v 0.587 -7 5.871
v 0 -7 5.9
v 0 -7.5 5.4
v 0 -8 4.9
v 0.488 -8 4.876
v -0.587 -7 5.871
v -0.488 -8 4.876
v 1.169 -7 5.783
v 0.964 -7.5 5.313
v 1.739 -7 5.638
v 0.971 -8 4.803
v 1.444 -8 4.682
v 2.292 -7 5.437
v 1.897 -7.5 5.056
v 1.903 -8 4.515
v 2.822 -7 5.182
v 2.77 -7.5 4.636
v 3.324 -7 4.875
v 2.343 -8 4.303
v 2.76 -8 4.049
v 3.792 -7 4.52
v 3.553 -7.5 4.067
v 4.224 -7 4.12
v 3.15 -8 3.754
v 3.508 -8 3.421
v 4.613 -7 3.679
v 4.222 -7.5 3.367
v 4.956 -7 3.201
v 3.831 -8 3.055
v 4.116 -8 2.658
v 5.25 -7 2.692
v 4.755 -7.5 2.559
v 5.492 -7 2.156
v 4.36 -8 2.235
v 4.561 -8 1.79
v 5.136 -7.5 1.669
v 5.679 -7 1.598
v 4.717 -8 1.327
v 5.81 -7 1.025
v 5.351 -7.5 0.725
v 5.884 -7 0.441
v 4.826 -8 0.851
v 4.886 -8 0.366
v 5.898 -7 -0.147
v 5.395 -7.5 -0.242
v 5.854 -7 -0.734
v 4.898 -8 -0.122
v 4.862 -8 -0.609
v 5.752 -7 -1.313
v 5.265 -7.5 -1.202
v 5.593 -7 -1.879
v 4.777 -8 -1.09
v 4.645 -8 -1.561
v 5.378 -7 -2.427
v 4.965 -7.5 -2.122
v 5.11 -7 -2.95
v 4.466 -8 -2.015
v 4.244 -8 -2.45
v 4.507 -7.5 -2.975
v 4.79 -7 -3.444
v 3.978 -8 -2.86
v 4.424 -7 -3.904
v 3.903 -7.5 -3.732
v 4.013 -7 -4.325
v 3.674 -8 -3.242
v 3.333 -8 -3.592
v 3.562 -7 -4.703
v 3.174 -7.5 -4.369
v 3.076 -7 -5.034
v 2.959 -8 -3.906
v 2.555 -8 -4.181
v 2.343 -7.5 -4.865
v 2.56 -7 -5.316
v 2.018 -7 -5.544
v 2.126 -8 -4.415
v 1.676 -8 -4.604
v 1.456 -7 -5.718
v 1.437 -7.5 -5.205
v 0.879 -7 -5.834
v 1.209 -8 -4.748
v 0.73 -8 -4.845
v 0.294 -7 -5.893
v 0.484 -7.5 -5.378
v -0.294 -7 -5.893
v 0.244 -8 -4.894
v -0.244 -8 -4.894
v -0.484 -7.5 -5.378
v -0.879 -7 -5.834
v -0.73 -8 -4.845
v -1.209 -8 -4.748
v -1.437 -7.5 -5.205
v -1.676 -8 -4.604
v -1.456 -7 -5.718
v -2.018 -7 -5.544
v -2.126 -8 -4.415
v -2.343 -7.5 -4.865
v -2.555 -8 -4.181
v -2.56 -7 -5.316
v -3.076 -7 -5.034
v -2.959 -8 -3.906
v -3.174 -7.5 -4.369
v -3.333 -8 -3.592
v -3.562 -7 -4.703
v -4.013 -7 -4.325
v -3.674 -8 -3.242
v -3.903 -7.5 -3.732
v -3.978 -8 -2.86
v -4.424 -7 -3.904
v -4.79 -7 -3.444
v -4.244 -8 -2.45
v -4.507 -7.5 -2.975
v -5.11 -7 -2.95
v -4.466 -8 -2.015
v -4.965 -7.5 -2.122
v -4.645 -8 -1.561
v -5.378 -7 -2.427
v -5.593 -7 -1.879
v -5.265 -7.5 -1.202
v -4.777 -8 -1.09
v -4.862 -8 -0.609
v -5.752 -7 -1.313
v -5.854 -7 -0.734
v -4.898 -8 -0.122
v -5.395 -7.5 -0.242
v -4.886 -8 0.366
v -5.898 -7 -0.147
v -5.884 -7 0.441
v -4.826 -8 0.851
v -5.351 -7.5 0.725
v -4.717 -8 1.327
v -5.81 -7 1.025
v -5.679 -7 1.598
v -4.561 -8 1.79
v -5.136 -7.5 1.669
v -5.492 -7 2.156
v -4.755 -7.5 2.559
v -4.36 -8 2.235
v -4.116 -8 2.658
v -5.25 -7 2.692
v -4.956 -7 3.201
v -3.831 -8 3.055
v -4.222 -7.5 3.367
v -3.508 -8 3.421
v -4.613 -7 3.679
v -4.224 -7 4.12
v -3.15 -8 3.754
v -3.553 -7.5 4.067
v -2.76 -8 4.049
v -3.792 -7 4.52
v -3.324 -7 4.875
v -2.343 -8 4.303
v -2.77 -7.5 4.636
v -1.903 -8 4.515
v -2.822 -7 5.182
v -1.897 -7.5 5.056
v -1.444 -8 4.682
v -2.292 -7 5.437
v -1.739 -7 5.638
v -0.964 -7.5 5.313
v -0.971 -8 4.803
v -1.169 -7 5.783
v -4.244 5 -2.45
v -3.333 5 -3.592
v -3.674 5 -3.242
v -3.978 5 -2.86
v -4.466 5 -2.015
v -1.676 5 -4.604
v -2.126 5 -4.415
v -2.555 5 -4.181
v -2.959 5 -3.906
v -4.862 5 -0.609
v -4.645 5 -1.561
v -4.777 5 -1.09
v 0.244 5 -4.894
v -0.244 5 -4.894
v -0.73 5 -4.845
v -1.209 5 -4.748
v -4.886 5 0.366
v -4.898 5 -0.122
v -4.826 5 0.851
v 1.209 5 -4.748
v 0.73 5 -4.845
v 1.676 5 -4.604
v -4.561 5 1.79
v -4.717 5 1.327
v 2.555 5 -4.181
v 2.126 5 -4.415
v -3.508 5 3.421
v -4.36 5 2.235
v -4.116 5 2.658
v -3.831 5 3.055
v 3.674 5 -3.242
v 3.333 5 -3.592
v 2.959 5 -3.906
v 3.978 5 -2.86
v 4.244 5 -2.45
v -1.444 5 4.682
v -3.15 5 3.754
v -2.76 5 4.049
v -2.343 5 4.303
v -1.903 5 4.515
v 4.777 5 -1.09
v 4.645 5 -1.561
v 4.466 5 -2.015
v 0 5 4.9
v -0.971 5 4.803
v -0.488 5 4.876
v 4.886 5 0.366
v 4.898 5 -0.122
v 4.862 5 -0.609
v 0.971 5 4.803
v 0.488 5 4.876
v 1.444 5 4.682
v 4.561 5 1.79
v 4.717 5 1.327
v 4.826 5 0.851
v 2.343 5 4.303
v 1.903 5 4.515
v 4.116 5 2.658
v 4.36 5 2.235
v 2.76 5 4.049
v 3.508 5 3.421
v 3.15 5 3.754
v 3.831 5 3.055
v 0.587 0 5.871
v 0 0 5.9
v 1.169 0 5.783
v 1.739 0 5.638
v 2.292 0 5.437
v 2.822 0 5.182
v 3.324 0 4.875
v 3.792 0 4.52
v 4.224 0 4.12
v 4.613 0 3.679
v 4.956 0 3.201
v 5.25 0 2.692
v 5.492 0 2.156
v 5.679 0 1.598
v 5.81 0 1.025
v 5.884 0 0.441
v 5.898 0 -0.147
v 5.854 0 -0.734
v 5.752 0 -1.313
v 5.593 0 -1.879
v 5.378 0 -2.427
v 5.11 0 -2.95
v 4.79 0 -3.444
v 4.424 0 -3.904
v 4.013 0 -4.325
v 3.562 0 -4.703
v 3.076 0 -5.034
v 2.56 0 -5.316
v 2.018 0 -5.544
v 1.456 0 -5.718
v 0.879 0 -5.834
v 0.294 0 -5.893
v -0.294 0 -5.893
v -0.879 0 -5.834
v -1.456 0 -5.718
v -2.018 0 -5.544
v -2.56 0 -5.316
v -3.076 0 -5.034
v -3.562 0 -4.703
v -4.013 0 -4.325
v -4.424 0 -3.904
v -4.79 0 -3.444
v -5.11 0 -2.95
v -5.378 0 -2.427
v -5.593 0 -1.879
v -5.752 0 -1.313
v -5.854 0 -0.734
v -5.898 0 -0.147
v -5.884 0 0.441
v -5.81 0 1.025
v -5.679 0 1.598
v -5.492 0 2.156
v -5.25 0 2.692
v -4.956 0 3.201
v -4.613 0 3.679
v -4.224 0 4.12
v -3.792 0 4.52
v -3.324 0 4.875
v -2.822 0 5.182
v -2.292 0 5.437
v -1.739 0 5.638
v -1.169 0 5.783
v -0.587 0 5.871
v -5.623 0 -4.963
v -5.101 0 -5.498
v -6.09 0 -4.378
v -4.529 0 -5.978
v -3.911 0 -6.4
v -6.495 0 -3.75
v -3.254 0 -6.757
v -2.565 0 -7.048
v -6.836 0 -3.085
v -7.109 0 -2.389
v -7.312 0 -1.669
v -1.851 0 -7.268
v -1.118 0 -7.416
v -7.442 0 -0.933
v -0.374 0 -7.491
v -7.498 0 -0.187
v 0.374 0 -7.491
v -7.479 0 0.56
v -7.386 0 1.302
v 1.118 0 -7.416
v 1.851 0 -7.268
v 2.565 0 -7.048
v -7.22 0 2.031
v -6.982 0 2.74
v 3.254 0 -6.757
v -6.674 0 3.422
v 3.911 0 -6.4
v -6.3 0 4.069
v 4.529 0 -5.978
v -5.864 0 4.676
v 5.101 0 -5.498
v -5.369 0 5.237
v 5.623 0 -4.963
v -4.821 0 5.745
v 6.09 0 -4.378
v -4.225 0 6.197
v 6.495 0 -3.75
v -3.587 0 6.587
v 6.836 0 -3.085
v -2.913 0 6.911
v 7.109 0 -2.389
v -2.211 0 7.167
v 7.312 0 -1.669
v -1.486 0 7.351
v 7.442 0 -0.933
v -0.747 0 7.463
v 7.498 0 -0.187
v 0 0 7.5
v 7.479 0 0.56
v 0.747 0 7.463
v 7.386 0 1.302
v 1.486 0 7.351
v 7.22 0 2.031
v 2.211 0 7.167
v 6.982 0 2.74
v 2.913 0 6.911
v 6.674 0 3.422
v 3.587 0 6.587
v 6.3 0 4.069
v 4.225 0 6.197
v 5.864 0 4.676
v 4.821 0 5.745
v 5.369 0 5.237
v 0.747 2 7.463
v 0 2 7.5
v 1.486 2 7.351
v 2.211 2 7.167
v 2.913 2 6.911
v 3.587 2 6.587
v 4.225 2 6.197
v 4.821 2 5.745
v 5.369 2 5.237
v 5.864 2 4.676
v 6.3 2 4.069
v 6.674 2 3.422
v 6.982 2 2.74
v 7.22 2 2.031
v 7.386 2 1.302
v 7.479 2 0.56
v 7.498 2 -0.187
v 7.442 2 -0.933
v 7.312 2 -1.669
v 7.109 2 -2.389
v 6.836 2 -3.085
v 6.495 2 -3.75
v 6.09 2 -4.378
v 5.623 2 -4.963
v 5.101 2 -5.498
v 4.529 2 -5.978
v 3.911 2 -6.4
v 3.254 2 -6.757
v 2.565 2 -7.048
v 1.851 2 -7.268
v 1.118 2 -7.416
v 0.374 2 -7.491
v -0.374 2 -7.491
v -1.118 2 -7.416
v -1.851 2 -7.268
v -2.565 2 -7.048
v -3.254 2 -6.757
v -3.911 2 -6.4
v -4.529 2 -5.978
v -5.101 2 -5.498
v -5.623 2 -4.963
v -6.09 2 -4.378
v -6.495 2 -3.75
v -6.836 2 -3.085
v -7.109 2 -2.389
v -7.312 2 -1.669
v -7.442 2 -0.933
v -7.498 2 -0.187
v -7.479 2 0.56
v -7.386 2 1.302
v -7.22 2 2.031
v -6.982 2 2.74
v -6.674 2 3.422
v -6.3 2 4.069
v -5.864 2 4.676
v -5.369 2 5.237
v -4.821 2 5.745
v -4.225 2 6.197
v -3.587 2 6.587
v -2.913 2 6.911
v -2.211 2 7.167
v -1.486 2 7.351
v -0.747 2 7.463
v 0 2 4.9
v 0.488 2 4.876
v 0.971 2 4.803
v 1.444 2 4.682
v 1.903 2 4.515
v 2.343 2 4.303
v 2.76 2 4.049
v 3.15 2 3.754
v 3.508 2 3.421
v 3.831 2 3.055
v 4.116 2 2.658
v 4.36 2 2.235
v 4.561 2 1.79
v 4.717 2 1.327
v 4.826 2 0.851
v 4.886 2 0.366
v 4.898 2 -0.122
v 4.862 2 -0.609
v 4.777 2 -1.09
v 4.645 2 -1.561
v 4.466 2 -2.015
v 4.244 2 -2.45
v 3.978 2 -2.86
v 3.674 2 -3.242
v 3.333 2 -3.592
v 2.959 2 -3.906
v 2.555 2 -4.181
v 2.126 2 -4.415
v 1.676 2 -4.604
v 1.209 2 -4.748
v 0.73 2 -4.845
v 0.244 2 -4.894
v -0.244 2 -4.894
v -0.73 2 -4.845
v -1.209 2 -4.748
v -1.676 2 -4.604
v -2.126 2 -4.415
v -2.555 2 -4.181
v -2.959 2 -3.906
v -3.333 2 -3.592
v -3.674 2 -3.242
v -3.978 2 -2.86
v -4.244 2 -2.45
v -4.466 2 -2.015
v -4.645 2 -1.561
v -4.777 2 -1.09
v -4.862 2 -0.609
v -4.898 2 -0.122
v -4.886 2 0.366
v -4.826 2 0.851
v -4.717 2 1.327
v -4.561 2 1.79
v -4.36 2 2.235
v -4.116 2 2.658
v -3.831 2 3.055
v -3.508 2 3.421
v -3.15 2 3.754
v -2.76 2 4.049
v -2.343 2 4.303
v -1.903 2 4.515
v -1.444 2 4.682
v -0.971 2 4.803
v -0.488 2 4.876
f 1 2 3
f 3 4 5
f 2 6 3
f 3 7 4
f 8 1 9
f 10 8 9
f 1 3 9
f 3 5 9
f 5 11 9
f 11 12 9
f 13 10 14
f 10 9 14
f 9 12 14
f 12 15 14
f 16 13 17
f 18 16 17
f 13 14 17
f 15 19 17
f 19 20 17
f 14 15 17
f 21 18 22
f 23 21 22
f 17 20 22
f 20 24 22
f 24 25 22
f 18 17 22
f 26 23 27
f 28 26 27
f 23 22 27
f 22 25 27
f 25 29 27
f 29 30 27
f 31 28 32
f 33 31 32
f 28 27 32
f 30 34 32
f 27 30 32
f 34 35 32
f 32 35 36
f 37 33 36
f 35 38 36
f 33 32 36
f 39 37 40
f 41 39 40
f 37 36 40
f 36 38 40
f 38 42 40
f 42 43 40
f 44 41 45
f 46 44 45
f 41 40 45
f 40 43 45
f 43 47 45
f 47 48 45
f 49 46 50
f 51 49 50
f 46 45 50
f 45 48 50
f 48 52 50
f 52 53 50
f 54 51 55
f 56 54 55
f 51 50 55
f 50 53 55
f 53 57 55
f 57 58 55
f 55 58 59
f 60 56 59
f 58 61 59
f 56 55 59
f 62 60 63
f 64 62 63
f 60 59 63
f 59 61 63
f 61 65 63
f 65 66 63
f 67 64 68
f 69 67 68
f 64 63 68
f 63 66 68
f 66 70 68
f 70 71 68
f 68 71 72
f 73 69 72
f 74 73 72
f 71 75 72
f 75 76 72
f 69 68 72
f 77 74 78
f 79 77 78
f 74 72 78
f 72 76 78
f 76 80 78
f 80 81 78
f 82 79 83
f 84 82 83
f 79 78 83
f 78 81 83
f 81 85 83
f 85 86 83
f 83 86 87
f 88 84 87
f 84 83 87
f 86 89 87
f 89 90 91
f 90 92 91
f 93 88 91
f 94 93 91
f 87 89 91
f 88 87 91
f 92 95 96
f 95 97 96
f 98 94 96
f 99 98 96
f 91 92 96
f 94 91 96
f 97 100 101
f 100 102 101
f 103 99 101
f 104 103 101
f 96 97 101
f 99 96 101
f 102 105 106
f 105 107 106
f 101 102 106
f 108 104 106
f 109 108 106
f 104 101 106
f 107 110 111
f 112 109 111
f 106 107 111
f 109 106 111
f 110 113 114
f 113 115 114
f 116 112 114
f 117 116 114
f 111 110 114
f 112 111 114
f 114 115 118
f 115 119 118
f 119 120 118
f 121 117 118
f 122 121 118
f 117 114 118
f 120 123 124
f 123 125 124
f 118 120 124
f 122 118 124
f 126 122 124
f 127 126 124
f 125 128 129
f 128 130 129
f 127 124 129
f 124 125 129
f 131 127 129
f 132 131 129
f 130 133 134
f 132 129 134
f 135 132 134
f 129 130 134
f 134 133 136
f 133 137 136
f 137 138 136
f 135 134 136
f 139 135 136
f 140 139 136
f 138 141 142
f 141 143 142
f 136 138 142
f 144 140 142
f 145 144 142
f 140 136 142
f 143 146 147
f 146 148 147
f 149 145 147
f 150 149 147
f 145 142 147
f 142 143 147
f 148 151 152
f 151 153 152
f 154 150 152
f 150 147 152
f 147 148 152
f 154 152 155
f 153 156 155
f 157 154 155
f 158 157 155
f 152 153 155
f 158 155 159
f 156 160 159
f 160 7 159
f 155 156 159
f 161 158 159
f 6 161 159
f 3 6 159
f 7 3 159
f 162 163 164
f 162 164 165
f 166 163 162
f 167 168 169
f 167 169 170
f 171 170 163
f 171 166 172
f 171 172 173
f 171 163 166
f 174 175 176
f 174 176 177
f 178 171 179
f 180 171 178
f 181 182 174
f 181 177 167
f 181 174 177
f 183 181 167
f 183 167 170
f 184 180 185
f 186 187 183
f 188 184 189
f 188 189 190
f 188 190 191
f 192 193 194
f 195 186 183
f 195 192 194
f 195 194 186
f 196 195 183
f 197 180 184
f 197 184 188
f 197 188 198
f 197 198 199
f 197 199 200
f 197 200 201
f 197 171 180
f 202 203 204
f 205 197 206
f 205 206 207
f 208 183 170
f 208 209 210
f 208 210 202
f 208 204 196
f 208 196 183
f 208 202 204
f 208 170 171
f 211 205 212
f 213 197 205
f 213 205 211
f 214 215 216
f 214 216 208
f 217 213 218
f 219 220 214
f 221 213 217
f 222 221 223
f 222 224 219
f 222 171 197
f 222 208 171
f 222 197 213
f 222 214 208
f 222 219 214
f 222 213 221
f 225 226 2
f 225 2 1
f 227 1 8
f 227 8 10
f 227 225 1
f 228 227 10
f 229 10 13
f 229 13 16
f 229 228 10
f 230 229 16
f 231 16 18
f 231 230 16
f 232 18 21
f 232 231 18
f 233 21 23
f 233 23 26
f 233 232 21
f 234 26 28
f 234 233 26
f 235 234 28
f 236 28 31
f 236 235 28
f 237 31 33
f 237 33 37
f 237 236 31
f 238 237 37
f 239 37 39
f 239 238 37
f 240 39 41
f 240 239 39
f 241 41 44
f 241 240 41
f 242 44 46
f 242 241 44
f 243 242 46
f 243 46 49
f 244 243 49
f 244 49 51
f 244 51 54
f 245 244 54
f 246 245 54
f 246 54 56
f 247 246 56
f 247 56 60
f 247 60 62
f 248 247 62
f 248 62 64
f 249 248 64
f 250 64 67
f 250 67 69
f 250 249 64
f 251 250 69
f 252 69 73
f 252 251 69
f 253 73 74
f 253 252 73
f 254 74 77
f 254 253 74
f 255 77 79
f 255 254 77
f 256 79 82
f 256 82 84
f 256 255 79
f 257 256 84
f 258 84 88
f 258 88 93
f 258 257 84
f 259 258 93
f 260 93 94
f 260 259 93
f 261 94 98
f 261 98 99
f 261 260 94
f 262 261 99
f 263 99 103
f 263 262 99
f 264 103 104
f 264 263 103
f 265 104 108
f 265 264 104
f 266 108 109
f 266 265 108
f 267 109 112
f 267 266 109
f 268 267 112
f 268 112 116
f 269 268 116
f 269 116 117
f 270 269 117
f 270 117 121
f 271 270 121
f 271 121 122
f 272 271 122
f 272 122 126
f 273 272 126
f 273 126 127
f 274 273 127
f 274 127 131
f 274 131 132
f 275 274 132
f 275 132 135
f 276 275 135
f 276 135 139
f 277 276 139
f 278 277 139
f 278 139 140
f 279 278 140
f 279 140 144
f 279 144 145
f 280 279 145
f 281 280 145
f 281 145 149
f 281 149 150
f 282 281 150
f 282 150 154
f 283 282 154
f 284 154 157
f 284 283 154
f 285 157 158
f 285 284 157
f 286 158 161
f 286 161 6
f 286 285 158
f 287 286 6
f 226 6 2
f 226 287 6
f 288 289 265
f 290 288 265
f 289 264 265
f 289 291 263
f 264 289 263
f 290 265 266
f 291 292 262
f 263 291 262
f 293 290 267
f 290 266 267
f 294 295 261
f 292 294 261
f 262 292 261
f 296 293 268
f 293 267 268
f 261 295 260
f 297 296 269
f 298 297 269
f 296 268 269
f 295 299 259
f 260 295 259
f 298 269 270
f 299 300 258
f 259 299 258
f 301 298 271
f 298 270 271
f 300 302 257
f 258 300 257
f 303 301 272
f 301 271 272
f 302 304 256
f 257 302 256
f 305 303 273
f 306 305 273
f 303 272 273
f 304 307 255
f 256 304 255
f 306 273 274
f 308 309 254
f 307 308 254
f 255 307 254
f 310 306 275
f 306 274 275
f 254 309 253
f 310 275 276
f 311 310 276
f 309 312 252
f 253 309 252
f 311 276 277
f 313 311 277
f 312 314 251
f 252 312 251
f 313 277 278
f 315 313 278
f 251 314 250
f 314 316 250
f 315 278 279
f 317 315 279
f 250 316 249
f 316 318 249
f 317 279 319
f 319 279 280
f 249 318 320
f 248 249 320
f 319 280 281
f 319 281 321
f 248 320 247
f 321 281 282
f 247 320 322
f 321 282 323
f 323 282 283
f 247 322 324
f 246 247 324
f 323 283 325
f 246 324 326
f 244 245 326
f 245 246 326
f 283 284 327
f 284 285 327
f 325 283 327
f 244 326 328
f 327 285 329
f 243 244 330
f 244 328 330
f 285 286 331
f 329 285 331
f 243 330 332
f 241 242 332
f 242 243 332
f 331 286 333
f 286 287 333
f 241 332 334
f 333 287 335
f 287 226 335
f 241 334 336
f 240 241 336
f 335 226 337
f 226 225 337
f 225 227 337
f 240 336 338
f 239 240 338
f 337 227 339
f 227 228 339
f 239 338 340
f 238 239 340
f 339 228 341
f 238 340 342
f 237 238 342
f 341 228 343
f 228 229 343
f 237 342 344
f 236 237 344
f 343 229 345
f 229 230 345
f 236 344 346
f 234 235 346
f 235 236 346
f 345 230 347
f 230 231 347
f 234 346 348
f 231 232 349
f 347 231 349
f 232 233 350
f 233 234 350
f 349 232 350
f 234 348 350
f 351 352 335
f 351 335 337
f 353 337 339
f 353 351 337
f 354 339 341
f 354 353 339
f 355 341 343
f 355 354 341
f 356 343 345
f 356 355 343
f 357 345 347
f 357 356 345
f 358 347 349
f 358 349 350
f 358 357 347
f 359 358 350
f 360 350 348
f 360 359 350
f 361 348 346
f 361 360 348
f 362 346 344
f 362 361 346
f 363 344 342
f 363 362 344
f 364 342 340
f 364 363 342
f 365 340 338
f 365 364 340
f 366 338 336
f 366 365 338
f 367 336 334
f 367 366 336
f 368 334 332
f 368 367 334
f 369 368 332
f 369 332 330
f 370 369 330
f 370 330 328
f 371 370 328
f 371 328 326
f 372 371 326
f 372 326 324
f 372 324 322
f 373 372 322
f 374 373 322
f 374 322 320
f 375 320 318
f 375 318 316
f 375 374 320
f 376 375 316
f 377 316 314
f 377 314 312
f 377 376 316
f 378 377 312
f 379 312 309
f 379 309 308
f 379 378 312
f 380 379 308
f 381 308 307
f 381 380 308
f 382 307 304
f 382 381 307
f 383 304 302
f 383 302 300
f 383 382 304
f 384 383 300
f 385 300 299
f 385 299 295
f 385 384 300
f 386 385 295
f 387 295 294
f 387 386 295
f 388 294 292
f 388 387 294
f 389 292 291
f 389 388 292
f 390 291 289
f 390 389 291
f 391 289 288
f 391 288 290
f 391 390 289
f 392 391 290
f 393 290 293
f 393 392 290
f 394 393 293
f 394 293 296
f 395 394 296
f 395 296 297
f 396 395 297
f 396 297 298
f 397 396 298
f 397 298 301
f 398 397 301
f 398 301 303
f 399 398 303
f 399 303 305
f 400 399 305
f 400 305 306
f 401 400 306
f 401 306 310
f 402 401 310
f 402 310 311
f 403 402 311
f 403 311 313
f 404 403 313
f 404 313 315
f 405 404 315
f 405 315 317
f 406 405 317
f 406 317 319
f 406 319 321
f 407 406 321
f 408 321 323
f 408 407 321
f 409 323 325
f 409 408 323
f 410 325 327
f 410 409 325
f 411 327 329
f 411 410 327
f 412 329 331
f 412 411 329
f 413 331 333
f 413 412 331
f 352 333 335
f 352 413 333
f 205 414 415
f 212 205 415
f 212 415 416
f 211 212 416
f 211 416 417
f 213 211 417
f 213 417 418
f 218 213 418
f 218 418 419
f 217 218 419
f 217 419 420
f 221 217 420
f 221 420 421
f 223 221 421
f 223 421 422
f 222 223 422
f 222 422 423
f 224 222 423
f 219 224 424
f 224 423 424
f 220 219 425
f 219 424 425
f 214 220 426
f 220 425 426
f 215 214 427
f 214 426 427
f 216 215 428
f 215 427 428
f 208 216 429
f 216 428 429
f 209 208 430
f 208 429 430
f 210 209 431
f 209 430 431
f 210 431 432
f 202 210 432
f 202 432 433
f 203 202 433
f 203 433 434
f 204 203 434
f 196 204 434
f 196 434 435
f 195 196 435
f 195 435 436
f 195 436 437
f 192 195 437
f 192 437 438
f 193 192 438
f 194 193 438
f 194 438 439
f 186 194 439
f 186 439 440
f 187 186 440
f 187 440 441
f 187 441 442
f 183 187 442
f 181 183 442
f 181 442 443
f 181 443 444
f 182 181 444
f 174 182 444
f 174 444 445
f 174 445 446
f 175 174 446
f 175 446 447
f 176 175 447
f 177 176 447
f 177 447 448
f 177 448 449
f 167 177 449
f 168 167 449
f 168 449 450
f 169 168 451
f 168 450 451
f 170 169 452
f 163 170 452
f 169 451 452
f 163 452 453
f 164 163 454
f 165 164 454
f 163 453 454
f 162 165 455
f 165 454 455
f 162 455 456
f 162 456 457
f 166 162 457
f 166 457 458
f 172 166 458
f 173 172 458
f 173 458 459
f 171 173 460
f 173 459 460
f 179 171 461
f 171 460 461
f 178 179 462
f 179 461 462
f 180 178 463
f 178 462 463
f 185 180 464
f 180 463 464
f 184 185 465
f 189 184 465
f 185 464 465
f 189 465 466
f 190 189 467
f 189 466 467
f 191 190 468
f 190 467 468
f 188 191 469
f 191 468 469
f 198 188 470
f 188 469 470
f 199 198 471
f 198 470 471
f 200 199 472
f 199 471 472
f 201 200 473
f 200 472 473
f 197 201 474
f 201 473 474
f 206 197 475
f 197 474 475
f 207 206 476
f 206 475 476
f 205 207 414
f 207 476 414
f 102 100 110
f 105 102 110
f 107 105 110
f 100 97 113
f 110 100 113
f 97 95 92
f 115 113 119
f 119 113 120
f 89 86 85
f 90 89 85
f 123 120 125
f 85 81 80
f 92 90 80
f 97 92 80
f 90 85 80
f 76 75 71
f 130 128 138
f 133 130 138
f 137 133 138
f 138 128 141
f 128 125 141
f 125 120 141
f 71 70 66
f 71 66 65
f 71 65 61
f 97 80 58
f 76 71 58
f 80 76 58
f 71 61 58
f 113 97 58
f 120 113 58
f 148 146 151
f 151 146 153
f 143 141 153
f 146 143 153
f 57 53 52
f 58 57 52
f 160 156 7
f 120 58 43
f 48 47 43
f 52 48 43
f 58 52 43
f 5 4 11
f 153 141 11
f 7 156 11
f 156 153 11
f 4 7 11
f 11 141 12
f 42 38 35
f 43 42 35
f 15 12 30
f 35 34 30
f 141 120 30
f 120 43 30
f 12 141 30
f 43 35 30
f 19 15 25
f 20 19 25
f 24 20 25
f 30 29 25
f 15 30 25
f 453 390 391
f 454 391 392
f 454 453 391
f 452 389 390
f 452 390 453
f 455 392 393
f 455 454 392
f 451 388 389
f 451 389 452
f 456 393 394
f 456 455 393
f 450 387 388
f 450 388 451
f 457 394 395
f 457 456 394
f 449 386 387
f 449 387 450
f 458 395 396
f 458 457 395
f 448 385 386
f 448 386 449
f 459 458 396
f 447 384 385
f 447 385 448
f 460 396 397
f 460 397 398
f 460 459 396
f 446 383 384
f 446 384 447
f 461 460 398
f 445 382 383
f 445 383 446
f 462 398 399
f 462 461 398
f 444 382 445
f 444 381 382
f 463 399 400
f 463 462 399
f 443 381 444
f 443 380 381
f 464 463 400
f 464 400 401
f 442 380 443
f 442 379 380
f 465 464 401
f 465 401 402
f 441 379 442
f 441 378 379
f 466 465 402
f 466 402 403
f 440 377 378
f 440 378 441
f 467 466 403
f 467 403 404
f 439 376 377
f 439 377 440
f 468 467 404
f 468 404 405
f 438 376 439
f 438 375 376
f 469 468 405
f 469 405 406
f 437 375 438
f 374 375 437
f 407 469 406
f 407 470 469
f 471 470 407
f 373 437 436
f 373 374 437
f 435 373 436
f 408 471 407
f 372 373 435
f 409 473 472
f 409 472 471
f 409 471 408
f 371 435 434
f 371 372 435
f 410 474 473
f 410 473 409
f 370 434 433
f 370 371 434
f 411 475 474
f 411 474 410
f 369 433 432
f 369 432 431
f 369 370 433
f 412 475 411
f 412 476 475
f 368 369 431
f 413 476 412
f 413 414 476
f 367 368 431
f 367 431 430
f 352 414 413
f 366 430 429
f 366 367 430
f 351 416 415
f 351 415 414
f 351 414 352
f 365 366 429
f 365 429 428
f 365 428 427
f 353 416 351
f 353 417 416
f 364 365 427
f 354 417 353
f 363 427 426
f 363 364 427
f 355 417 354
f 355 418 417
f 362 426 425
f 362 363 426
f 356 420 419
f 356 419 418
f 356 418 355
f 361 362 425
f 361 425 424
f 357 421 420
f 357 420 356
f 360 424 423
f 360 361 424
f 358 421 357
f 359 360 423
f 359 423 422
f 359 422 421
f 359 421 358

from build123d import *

# Parameters (mm, degrees)
SKETCH1_R           = 4.9
BOSS_EXTRUDE1_DEPTH = 5
SKETCH2_R           = 7.5
BOSS_EXTRUDE2_DEPTH = 2
SKETCH3_R           = 5.9
BOSS_EXTRUDE3_DEPTH = 8
CHAMFER1_SIZE       = 1


with BuildPart() as part:
    # Sketch1 → Boss-Extrude1 (new body)
    with BuildSketch(Plane(origin=(0, 0, 0), x_dir=(1, 0, 0), z_dir=(0, 1, 0))):
        with Locations(Location((0, 0, 0), (0, 0, 270))):
            Circle(SKETCH1_R)
    extrude(amount=BOSS_EXTRUDE1_DEPTH)

    # Sketch2 → Boss-Extrude2 (add)
    with BuildSketch(Plane(origin=(0, 1.999999904, 0), x_dir=(1, 0, 0), z_dir=(0, 1, 0))):
        with Locations(Location((0, 0, 0), (0, 0, 270))):
            Circle(SKETCH2_R)
    extrude(amount=-BOSS_EXTRUDE2_DEPTH)

    # Sketch3 → Boss-Extrude3 (add)
    with BuildSketch(Plane(origin=(0, 0, 0), x_dir=(1, 0, 0), z_dir=(0, 1, 0))):
        with Locations(Location((0, 0, 0), (0, 0, 270))):
            Circle(SKETCH3_R)
    extrude(amount=-BOSS_EXTRUDE3_DEPTH)

    # Chamfer1
    chamfer1_edges = [part.edges().sort_by_distance(p)[0] for p in [
        (0, -8, -5.9),
    ]]
    chamfer(chamfer1_edges, length=CHAMFER1_SIZE)


solid = part.part
